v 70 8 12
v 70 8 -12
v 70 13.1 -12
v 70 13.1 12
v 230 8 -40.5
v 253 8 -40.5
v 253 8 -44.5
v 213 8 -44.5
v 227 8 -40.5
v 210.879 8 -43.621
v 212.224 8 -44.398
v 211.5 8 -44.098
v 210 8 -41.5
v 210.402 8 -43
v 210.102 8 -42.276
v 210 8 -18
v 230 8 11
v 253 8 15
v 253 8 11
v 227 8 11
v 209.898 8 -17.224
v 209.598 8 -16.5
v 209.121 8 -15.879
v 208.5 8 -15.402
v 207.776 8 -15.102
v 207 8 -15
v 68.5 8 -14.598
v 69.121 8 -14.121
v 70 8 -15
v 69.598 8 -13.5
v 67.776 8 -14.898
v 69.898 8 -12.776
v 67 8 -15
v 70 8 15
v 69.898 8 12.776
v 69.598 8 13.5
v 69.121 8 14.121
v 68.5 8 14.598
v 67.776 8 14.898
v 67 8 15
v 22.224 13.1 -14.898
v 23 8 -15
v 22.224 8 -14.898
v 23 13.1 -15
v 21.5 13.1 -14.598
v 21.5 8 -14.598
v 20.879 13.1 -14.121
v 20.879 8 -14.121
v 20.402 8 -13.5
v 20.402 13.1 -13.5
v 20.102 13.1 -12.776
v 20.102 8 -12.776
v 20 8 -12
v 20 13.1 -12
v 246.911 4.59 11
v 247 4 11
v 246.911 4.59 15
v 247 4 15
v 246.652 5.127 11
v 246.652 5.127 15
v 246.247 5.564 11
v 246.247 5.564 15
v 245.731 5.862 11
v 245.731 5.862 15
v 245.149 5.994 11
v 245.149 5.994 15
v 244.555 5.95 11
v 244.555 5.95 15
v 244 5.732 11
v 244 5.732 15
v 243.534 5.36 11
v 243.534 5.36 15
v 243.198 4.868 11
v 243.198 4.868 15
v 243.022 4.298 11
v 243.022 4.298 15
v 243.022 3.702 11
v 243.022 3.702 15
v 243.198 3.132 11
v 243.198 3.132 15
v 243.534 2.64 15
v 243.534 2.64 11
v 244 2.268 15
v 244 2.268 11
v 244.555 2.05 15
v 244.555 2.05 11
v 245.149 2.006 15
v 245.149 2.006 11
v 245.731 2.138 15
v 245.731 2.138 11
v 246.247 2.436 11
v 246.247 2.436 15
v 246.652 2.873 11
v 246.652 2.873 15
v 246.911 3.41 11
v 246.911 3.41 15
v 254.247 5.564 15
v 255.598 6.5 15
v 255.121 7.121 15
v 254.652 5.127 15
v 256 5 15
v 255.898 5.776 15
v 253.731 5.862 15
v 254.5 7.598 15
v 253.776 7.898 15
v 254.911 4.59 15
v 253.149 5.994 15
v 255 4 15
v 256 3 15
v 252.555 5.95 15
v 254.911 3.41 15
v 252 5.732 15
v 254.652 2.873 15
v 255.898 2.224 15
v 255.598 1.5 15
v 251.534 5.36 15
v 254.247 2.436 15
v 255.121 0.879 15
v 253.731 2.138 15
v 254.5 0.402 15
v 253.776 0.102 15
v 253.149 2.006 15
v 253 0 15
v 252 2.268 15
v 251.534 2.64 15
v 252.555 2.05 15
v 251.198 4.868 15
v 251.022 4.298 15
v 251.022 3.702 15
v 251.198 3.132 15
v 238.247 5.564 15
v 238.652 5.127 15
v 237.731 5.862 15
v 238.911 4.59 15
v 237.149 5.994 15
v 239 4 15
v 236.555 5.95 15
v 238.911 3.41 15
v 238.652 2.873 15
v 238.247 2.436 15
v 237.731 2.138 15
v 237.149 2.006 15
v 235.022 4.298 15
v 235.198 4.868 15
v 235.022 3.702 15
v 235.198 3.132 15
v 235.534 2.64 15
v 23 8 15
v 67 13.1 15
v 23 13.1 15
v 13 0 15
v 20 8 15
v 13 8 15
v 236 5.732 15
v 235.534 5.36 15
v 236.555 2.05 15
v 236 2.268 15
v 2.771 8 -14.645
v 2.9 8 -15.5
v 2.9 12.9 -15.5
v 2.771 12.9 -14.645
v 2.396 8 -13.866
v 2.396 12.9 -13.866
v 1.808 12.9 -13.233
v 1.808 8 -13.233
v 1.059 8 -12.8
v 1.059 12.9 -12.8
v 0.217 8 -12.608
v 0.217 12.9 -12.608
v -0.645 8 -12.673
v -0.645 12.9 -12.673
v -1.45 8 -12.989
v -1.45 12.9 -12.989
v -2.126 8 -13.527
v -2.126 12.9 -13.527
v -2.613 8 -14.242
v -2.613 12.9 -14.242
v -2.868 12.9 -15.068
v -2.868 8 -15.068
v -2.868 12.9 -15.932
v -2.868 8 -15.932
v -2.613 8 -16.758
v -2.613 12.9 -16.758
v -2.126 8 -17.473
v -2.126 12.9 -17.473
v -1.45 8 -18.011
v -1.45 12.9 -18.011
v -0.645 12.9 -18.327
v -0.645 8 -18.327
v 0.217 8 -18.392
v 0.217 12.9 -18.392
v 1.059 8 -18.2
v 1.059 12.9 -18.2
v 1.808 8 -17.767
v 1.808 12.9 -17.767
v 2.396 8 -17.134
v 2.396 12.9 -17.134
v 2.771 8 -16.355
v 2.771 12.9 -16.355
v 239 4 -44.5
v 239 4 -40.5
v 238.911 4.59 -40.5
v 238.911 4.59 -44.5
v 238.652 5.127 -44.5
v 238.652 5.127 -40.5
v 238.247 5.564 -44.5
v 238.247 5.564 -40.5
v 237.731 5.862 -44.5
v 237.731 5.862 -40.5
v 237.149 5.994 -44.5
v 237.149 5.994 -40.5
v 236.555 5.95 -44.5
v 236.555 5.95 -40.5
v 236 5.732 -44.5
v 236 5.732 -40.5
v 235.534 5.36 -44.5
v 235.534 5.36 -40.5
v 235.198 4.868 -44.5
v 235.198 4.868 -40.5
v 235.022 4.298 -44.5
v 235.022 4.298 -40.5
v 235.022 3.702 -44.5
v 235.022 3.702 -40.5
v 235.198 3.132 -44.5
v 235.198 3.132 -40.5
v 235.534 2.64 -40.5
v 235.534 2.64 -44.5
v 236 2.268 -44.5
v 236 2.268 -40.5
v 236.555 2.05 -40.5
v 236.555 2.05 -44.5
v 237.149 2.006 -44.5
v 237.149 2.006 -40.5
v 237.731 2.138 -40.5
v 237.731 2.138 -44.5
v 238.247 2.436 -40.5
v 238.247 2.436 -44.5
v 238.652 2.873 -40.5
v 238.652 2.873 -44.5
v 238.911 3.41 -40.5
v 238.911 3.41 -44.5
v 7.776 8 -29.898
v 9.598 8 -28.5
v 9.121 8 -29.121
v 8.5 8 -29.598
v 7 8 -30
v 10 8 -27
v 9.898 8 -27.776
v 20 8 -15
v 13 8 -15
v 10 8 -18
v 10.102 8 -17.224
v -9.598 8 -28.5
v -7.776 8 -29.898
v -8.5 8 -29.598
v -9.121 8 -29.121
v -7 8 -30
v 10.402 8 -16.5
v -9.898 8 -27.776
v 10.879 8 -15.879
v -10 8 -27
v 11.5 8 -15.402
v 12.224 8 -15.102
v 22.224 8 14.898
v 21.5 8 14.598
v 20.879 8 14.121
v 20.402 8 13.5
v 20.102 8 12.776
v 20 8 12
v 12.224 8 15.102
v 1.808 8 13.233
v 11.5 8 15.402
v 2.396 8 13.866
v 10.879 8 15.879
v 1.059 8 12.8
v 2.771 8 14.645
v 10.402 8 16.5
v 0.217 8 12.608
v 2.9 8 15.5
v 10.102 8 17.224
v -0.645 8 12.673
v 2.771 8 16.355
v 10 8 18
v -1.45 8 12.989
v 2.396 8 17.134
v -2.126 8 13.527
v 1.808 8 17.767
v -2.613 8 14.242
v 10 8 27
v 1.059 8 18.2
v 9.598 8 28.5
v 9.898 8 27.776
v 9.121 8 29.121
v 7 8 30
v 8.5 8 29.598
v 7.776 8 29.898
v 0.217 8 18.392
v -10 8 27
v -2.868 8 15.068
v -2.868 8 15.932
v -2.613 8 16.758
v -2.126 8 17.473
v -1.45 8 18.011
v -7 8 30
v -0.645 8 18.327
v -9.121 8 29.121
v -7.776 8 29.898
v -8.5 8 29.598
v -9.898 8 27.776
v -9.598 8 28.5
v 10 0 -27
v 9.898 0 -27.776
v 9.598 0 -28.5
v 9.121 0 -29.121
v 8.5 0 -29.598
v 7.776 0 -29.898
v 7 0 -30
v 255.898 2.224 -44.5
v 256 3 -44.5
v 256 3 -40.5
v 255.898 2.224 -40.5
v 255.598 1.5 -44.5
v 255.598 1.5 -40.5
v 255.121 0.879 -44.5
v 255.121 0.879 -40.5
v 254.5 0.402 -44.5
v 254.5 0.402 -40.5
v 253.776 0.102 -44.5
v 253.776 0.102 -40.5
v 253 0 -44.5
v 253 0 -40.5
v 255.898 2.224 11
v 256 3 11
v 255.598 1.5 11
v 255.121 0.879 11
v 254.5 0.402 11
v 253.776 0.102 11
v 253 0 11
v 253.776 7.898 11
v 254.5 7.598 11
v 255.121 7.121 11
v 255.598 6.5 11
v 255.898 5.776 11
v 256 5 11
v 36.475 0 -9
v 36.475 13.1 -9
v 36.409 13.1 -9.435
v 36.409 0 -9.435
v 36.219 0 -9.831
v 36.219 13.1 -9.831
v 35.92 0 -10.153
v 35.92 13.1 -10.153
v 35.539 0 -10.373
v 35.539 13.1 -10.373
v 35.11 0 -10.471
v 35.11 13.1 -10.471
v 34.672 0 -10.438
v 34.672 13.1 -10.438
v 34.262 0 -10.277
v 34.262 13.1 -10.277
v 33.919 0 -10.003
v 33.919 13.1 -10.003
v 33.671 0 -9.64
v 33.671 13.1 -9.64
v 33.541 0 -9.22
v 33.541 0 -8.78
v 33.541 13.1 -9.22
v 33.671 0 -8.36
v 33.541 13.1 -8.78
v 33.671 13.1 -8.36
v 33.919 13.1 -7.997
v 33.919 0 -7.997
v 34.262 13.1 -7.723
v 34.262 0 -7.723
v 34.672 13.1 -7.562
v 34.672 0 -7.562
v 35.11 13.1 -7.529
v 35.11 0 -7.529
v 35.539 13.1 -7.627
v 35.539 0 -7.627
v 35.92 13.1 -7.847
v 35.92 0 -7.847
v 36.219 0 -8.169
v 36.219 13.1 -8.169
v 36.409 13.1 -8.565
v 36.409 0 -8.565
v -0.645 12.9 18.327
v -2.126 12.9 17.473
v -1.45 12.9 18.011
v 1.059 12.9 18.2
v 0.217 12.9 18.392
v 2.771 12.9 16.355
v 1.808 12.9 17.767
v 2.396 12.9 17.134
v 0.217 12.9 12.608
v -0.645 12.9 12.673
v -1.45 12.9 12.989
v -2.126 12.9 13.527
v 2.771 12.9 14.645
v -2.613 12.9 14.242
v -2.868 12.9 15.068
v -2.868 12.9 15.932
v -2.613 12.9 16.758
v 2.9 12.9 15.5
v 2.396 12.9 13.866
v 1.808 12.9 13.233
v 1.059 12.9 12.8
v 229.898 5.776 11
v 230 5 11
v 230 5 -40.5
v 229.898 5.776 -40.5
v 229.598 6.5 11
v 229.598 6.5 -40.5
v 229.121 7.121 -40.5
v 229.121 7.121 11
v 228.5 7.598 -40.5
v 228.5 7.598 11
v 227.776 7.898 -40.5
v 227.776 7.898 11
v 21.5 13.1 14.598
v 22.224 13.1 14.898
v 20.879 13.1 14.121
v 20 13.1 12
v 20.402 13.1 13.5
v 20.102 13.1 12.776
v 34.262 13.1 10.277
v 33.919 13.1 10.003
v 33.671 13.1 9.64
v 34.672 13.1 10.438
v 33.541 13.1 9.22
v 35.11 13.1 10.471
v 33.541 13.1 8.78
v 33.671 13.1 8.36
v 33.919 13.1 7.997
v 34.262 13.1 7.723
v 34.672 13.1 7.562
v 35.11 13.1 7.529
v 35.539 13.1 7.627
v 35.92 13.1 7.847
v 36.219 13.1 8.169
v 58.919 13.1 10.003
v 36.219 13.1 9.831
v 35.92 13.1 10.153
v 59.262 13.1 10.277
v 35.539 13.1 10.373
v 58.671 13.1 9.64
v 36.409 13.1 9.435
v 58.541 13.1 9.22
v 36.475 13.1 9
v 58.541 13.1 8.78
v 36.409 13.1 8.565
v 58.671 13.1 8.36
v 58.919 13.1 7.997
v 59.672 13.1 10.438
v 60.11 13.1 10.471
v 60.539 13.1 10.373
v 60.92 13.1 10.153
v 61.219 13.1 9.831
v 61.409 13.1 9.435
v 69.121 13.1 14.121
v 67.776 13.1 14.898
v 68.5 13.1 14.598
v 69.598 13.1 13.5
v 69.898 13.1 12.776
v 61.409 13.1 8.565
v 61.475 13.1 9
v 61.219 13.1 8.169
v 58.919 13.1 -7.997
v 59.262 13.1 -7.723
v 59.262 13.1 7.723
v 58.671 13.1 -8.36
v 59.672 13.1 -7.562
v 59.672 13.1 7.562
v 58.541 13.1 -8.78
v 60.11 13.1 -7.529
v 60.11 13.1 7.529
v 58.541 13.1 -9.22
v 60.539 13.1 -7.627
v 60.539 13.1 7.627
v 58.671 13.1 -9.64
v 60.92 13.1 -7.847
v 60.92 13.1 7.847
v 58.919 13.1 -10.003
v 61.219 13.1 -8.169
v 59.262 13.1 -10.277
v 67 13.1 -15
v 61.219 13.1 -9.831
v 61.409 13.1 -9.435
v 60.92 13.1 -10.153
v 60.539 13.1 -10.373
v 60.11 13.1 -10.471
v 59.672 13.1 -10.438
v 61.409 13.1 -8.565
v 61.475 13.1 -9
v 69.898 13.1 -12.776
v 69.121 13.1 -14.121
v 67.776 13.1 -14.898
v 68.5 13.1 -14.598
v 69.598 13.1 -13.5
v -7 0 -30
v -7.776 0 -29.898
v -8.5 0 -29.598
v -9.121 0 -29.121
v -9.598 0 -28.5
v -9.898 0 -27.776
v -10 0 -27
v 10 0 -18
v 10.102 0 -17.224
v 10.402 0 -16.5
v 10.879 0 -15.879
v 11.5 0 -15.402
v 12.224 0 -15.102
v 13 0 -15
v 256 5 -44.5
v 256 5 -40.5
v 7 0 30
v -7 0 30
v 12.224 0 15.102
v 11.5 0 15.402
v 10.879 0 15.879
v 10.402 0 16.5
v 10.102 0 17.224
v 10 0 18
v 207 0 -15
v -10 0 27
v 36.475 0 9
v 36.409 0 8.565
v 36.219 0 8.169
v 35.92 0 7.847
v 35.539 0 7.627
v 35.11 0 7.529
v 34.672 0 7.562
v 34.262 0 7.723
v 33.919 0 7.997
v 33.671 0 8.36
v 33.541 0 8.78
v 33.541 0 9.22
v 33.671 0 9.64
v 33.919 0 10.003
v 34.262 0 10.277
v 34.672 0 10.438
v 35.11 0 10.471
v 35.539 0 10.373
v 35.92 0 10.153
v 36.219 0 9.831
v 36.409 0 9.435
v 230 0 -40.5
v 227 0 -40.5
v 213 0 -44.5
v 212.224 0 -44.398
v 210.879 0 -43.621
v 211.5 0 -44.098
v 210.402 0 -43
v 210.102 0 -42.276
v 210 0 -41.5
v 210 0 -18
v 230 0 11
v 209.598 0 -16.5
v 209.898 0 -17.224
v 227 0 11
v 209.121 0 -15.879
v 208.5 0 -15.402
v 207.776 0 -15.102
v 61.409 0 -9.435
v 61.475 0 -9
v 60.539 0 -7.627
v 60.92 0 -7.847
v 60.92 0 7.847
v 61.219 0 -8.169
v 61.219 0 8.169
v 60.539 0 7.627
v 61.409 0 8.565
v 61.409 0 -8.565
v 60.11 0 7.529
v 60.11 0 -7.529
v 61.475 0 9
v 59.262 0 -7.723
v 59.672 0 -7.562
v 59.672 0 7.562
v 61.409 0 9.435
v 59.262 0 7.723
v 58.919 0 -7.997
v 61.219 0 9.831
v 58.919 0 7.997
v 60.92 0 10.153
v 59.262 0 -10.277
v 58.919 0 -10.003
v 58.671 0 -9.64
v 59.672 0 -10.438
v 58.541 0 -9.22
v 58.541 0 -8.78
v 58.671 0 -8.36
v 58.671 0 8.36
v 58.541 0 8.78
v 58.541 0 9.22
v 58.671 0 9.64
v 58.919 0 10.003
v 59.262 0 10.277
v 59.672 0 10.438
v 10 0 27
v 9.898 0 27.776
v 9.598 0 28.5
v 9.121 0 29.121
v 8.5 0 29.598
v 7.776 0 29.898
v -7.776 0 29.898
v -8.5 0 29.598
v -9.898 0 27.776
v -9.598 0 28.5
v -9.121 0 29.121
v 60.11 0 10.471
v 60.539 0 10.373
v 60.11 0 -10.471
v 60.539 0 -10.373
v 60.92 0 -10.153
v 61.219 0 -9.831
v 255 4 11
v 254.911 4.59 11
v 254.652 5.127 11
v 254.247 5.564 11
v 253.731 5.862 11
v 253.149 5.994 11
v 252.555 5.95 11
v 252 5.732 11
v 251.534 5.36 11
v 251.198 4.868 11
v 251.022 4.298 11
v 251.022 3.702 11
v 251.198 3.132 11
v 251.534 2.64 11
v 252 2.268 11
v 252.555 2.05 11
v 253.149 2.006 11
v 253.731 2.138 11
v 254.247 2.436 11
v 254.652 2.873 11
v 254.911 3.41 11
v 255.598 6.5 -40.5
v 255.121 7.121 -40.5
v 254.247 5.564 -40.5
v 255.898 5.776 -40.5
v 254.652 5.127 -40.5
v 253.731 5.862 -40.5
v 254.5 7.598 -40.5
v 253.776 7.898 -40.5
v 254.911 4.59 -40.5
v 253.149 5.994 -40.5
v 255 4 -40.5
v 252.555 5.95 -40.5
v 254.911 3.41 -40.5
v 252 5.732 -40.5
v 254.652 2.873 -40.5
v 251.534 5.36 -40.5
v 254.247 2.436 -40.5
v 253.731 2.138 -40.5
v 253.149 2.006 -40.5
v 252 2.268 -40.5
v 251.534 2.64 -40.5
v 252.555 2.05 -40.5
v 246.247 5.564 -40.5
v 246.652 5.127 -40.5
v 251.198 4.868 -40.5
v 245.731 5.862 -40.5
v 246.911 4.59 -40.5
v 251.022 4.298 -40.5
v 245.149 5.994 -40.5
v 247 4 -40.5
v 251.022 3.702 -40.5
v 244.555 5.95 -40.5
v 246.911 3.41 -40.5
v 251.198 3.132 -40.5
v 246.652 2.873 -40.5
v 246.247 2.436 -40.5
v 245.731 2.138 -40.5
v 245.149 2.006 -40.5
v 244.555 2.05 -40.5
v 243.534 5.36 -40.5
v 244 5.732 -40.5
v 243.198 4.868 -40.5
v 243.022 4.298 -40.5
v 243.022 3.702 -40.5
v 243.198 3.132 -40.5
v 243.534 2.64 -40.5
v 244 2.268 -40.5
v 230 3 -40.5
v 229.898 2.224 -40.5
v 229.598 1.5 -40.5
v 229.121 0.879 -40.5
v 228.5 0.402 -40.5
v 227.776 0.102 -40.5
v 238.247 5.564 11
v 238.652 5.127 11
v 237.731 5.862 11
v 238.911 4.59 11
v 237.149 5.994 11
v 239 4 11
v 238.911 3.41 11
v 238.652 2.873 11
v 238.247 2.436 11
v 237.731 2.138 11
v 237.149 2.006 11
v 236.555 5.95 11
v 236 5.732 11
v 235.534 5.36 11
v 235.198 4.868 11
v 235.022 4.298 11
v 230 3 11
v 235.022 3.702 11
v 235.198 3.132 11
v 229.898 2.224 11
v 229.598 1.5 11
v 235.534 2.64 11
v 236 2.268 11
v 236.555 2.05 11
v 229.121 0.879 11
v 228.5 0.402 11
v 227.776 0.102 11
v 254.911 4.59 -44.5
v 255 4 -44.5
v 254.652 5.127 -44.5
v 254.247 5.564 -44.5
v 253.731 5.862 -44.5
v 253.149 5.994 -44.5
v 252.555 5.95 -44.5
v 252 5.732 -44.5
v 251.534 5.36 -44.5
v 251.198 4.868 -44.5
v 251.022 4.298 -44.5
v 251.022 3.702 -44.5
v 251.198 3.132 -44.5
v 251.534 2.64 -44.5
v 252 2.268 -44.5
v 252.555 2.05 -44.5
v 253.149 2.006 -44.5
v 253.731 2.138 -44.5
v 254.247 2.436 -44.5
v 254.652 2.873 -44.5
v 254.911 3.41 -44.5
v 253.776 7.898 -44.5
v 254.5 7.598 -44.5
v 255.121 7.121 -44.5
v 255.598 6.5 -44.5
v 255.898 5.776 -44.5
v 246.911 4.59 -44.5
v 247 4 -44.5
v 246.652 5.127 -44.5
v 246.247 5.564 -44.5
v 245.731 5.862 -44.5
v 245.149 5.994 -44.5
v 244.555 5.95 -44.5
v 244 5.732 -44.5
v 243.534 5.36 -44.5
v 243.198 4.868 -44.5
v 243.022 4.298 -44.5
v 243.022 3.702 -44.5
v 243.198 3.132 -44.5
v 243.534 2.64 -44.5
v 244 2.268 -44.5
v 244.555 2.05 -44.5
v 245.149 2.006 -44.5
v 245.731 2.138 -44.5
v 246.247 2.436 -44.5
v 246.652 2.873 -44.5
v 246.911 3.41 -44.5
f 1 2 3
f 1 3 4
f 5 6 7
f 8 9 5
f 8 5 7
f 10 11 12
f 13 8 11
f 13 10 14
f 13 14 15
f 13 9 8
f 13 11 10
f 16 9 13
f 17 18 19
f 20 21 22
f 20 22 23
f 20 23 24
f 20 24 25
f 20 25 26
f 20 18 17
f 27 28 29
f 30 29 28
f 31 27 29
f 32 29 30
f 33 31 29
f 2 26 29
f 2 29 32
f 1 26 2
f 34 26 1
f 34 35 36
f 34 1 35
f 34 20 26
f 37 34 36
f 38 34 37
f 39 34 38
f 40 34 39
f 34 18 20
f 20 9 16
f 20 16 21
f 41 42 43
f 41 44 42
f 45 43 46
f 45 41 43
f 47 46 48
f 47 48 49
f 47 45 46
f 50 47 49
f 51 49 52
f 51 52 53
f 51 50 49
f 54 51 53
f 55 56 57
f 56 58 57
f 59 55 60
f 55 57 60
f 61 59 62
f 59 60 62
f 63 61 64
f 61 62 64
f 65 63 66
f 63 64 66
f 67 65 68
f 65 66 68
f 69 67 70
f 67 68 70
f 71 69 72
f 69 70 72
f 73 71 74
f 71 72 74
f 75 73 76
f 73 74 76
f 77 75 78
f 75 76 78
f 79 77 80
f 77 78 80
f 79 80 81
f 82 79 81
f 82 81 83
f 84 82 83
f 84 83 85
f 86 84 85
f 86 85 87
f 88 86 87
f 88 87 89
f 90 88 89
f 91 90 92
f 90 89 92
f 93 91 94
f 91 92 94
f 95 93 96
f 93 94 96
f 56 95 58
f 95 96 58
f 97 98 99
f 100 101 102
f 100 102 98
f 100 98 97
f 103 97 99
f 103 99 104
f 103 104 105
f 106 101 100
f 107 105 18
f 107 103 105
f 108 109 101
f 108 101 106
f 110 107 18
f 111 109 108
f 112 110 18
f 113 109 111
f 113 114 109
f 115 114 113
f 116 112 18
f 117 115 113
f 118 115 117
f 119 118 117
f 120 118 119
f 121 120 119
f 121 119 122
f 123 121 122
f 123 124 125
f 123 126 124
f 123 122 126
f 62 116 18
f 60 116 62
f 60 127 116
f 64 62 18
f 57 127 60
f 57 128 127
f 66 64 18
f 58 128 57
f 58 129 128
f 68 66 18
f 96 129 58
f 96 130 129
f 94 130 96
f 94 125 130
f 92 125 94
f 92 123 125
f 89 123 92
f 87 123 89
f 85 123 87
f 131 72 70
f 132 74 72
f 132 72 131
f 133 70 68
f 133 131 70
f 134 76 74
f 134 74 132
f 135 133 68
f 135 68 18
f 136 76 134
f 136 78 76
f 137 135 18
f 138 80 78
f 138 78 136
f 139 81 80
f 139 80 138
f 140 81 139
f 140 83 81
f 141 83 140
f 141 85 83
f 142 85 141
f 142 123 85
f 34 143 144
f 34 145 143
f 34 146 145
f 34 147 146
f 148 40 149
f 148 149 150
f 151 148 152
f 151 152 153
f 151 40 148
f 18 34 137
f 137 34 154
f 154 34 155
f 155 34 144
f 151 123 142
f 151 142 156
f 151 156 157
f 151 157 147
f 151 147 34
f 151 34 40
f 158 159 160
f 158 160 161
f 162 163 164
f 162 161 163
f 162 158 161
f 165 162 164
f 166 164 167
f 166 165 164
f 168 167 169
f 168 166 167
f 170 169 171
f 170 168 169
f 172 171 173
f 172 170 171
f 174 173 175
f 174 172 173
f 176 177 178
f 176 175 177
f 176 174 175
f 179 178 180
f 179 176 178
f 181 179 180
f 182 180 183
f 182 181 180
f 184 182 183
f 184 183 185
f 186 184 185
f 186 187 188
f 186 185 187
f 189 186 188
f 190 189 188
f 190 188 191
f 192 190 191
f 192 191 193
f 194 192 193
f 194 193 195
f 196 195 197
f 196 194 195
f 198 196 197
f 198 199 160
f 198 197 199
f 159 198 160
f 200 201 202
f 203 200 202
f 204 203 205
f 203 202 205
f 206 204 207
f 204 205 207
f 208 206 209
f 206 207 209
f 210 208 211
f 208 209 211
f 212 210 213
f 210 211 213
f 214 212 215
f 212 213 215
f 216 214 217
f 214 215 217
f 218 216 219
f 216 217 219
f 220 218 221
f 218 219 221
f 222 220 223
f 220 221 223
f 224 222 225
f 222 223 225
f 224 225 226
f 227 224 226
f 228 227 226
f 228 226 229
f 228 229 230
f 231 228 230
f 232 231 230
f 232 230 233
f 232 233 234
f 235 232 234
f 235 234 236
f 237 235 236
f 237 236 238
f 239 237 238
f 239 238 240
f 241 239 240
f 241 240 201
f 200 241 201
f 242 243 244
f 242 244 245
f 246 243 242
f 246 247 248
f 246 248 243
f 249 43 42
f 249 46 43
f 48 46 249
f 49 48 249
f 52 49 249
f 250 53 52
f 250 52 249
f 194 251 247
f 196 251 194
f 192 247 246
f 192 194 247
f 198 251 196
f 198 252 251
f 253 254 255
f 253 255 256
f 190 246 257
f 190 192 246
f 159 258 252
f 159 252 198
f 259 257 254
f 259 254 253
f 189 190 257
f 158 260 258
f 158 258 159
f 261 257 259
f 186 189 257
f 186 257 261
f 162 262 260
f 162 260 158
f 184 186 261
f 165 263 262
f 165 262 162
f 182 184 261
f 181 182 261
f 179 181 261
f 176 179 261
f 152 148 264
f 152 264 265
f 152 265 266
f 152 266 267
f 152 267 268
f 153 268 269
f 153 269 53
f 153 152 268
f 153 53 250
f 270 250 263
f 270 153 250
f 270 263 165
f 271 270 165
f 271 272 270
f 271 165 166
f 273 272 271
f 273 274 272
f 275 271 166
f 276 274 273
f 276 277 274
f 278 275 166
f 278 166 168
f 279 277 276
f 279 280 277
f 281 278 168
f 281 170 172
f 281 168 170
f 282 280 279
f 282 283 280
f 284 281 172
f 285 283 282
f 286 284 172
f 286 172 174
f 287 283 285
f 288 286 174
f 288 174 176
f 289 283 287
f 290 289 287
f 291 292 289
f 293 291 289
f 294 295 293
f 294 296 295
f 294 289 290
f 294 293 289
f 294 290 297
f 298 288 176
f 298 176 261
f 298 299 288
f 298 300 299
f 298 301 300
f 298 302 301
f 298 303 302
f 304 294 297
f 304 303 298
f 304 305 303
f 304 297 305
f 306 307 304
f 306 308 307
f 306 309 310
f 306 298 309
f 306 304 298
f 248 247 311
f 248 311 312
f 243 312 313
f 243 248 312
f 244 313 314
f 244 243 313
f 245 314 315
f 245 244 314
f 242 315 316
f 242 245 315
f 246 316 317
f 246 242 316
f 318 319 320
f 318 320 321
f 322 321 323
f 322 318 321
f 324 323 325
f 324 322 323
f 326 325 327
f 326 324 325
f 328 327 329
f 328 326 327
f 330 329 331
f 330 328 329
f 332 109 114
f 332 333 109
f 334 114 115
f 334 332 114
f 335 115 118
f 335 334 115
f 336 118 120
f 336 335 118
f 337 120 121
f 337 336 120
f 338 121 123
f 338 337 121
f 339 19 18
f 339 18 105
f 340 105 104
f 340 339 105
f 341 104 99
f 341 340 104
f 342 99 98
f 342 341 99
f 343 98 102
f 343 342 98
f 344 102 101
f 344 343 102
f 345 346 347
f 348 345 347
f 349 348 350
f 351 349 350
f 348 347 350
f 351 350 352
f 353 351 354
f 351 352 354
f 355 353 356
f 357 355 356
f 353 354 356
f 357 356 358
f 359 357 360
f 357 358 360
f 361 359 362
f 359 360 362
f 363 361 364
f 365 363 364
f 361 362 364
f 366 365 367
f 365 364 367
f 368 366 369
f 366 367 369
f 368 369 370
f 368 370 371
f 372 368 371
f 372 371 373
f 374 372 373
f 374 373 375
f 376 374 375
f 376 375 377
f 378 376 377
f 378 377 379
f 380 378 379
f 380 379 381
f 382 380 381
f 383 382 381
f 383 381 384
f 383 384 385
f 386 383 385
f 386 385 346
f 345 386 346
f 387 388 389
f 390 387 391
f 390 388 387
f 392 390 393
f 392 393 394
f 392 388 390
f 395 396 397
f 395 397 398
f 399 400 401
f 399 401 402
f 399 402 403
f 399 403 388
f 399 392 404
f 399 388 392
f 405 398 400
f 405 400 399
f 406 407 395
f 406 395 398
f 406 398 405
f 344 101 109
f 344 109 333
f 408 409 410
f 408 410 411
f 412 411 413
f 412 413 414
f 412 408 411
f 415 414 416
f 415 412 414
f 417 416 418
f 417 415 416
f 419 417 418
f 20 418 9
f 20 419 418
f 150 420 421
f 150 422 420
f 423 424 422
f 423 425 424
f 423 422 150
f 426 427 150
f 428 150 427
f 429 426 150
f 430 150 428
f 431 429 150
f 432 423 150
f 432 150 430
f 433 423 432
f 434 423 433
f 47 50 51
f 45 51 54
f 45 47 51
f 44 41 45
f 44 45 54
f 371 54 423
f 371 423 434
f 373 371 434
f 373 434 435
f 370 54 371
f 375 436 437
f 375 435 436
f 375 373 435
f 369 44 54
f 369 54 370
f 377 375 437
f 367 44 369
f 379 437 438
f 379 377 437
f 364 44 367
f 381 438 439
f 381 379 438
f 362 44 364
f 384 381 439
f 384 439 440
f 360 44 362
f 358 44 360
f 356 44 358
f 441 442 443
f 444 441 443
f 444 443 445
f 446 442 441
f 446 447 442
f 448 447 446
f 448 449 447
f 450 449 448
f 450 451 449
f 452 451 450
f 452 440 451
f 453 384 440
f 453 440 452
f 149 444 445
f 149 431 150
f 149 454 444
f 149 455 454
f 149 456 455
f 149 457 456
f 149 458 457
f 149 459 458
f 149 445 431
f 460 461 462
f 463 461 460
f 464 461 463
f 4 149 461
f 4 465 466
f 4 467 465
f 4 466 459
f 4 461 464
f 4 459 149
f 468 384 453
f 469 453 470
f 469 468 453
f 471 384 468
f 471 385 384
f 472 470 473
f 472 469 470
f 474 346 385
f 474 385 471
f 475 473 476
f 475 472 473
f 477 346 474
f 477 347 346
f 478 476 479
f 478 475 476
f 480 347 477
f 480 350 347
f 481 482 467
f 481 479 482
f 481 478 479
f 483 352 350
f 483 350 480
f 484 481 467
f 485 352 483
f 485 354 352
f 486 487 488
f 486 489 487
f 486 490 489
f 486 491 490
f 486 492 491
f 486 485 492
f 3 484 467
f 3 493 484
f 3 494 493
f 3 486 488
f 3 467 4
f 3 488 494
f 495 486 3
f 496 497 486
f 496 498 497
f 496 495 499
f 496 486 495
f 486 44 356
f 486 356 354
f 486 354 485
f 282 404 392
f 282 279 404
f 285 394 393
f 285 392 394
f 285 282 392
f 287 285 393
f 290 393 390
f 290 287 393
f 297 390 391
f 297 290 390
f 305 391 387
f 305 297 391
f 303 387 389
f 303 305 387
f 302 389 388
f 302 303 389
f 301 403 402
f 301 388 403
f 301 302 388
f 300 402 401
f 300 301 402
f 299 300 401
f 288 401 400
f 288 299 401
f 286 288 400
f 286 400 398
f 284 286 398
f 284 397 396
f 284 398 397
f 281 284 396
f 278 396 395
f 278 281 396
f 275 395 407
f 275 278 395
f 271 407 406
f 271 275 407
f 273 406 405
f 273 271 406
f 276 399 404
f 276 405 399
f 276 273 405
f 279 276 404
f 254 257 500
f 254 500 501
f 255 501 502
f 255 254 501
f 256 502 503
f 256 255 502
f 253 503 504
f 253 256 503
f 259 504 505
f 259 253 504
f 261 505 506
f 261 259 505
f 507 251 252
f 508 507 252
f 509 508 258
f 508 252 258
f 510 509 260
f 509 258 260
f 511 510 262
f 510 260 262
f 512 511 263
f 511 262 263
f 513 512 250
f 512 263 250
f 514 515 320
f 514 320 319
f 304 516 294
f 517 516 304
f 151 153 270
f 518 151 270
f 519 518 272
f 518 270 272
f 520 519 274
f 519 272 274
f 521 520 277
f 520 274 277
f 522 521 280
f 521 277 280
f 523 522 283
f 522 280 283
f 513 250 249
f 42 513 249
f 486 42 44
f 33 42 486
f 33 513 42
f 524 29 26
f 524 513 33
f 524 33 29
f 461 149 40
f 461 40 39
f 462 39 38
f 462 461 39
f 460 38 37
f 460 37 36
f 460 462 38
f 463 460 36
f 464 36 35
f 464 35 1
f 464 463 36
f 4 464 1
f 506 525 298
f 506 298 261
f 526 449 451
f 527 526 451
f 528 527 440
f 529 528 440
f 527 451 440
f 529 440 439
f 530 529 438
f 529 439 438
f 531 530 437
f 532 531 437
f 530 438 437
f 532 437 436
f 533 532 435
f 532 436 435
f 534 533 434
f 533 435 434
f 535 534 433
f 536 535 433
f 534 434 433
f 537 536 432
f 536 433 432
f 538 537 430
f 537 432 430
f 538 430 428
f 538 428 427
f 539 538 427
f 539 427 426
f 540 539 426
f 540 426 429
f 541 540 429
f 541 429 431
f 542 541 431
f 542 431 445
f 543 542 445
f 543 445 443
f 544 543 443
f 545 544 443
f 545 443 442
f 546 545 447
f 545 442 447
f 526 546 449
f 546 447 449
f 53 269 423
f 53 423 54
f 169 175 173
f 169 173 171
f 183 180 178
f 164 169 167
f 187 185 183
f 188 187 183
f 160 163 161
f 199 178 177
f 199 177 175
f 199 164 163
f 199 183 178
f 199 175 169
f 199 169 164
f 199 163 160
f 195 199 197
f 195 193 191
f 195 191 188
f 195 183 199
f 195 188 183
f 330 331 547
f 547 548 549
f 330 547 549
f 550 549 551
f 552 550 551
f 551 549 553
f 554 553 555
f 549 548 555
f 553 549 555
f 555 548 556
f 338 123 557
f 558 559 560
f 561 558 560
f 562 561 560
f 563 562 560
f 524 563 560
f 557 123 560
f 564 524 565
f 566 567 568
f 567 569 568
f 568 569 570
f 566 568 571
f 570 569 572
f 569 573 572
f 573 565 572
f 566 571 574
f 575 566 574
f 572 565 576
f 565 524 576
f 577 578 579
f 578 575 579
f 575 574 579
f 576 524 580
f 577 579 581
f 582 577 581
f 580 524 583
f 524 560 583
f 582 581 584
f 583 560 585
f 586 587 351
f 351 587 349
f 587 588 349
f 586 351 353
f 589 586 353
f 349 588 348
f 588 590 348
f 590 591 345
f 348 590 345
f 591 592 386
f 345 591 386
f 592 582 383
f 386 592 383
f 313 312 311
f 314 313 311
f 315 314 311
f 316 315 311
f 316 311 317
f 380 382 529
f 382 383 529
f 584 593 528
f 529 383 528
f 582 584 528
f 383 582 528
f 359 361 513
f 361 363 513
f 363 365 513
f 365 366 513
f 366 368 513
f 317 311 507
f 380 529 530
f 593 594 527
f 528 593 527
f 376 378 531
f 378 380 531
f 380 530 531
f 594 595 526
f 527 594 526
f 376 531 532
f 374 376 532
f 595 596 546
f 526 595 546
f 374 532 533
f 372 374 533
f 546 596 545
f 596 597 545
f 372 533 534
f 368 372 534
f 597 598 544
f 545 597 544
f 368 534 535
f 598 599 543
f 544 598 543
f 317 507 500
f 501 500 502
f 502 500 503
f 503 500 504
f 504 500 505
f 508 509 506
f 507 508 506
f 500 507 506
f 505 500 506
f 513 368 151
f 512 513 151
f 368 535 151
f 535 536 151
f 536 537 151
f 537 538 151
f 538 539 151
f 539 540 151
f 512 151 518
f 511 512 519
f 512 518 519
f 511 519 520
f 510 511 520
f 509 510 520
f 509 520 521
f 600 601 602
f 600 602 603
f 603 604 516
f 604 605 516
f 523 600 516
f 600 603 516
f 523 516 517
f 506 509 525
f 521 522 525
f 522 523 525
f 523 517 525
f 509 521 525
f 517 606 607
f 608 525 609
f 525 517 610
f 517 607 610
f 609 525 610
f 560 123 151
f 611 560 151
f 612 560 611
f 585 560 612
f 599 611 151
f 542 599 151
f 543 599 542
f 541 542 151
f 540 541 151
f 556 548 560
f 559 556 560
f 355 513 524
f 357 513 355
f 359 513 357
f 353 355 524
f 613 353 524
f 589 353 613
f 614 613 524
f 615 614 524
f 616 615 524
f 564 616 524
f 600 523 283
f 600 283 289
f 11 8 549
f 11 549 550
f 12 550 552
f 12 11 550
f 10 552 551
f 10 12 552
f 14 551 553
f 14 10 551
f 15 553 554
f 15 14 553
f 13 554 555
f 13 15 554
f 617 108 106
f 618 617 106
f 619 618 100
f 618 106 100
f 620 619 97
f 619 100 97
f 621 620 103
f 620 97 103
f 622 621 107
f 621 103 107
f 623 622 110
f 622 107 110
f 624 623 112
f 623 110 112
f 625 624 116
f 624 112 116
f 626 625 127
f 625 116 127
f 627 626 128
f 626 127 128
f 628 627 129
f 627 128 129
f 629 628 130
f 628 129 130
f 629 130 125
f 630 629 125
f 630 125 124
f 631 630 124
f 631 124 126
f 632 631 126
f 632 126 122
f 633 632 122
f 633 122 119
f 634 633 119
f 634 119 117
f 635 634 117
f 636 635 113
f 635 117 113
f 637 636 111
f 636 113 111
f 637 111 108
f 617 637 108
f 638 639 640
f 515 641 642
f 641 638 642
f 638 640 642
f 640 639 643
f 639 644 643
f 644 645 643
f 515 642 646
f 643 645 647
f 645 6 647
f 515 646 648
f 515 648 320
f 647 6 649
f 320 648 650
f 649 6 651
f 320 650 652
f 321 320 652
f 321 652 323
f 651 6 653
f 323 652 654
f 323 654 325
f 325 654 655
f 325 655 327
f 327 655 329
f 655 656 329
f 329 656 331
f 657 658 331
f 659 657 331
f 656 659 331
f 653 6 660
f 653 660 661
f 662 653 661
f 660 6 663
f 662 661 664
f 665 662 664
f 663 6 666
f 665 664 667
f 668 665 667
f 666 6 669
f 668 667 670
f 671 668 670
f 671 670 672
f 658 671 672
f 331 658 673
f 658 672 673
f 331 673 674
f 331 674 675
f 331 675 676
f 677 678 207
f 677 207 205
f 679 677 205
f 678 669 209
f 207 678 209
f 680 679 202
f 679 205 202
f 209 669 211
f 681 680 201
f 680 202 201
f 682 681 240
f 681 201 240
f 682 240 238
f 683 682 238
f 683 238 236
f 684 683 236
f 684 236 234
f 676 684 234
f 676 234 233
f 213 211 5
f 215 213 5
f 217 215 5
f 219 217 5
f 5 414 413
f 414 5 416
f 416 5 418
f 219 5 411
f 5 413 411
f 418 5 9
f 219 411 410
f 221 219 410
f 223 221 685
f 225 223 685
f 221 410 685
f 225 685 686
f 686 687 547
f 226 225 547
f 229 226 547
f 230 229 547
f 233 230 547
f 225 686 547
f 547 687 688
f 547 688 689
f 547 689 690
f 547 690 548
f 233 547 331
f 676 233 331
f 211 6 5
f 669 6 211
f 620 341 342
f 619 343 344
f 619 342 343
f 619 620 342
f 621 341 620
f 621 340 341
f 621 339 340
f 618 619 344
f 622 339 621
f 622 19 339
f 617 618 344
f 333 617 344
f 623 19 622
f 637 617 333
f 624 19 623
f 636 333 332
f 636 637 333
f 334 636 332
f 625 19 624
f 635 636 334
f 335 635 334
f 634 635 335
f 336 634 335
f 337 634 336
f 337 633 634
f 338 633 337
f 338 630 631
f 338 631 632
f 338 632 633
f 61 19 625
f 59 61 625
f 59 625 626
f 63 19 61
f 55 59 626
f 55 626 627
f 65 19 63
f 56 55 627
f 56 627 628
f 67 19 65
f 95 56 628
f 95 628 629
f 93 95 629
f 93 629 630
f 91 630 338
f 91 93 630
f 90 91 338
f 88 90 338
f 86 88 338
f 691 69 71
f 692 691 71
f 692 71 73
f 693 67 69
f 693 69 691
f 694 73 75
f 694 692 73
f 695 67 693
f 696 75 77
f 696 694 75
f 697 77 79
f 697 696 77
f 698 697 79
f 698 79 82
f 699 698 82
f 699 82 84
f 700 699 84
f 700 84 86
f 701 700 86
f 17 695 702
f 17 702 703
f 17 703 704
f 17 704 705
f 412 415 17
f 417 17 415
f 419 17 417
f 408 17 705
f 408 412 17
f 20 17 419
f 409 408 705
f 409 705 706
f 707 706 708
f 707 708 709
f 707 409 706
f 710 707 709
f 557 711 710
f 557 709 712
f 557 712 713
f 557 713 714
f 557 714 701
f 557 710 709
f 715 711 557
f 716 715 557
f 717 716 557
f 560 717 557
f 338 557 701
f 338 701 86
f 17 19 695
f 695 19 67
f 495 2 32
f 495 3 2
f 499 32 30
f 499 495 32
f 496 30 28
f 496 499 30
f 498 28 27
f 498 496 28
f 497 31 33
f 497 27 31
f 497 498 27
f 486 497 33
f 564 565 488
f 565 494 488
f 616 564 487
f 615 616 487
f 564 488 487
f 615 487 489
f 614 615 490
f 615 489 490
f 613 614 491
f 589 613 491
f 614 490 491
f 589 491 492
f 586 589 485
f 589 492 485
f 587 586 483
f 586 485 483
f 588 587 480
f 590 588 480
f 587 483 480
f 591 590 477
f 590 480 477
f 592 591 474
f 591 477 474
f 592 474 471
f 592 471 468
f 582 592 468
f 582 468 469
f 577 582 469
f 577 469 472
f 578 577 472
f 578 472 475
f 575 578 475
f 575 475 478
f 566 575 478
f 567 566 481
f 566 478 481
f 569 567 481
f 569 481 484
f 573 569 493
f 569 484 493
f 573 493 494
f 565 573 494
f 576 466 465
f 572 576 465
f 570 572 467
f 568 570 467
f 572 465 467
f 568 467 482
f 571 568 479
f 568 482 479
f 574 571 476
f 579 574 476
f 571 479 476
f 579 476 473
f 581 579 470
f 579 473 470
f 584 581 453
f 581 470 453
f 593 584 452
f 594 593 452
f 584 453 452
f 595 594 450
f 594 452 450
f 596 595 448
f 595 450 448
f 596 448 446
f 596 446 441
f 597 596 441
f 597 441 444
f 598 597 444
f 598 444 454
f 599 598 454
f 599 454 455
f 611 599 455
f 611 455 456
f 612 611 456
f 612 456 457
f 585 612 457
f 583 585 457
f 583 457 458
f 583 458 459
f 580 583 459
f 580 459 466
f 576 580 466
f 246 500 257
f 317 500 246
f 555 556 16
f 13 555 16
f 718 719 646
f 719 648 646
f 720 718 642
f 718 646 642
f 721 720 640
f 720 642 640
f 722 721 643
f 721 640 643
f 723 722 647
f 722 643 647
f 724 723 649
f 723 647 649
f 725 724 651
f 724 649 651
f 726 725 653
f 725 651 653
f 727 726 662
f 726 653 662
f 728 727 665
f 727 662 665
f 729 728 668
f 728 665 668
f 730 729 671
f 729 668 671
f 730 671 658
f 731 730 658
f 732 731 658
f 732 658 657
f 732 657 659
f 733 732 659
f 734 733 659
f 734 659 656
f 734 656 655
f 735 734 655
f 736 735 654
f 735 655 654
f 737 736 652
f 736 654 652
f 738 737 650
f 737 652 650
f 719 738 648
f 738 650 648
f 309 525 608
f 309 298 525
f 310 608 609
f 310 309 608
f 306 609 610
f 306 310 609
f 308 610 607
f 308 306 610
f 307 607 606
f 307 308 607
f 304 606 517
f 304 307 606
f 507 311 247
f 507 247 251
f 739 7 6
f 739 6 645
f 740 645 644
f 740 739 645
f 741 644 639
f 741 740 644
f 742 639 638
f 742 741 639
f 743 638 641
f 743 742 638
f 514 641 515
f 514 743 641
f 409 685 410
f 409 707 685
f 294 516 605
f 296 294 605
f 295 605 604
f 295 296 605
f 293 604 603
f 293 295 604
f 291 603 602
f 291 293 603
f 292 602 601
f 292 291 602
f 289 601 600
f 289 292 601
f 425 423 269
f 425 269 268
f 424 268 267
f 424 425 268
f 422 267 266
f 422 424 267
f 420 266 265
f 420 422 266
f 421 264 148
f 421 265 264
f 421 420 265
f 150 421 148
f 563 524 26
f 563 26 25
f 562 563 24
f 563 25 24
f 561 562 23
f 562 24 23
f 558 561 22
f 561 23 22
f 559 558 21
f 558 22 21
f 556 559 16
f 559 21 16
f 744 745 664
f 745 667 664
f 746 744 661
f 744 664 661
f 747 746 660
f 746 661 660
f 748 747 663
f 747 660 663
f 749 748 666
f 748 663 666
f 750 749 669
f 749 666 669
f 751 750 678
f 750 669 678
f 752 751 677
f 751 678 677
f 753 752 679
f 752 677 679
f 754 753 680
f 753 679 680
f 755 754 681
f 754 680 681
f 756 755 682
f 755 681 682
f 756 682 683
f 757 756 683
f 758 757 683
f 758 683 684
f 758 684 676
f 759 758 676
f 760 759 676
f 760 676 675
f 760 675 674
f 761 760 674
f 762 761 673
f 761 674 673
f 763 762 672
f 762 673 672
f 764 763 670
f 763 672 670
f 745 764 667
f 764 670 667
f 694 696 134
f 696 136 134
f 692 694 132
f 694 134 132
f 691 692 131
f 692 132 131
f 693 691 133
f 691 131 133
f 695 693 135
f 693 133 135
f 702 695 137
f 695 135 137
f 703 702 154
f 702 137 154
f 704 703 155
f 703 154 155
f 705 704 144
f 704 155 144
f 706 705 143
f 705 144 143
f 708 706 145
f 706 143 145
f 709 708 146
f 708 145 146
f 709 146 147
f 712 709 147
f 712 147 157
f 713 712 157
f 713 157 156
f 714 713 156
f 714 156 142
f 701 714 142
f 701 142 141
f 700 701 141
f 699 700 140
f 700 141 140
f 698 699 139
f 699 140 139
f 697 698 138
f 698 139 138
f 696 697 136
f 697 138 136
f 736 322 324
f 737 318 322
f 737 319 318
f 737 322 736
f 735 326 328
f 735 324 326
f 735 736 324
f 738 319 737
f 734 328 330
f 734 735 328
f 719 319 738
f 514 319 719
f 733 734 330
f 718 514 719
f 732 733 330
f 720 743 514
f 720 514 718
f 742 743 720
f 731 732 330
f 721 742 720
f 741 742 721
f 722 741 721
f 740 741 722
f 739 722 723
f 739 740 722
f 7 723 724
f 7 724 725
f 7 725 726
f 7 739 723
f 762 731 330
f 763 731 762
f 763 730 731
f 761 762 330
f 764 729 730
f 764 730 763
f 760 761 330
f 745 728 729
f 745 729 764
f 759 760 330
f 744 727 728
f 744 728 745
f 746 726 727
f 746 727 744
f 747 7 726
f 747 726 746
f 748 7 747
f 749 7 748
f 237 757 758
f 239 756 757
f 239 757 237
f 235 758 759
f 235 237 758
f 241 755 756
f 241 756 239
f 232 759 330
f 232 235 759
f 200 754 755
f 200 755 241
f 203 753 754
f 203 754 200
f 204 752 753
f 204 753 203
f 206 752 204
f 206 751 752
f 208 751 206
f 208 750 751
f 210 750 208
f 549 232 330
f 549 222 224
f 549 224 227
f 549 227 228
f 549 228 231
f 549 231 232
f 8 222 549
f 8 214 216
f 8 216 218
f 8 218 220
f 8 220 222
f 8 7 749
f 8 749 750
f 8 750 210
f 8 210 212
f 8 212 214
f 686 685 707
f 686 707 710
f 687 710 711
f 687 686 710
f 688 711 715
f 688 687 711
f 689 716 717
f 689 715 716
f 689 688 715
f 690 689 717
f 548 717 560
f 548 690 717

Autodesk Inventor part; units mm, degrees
ref_plane "YZ Plane" through (0, 0, 0) normal (1, 0, 0) x (0, 1, 0)
ref_plane "XZ Plane" through (0, 0, 0) normal (0, 1, 0) x (-1, 0, 0)
ref_plane "XY Plane" through (0, 0, 0) normal (0, 0, 1) x (1, 0, 0)
sketch "Sketch1" plane through (0, 0, 0) normal (0, 1, 0) x (-1, 0, 0)
  line L0 (10, 30) -> (10, -30)
  line L1 (10, -30) -> (-10, -30)
  line L2 (-10, -30) -> (-10, -15)
  line L3 (-10, -15) -> (-230, -15)
  line L4 (-230, -15) -> (-230, 15)
  line L5 (-230, 15) -> (-10, 15)
  line L6 (-10, 15) -> (-10, 30)
  line L7 (-10, 30) -> (10, 30)
  line L8 (58, 0) -> (-278, 0) construction
  point P0 (0, 0)
  dimension "d0" = 60
  dimension "d2" = 10
  dimension "d3" = 10
  dimension "d4" = 30
  dimension "d5" = 220
extrude "Extrusion1" add sketch "Sketch1" along normal blind 8
sketch "Sketch2" plane through (0, 8, 0) normal (0, 1, 0) x (1, 0, 0)
  circle A0 centre (0, -15.5) radius 2.9
  circle A1 centre (0, 15.5) radius 2.9
  line L0 (0, 42) -> (0, -42) construction
  line L1 (-58, 0) -> (278, 0) construction
  point P0 (0, 0)
  dimension "d8" = 5.8
  dimension "d9" = 31
extrude "Extrusion2" add sketch "Sketch2" along normal blind 4.9
sketch "Sketch3" plane through (0, 8, 0) normal (0, 1, 0) x (1, 0, 0)
  line L0 (230, 15) -> (10, 15) construction
  line L1 (10, -15) -> (230, -15) construction
  line L2 (20, 15) -> (70, 15)
  line L3 (70, 15) -> (70, -15)
  line L4 (70, -15) -> (20, -15)
  line L5 (20, -15) -> (20, 15)
  point P0 (0, 0)
  dimension "d12" = 10
  dimension "d13" = 50
extrude "Extrusion3" add sketch "Sketch3" along normal blind 5.1
sketch "Sketch4" plane through (0, 13.1, 0) normal (0, 1, 0) x (1, 0, 0)
  circle A0 centre (35, 9) radius 1.475
  circle A1 centre (60, 9) radius 1.475
  circle A2 centre (35, -9) radius 1.475
  circle A3 centre (60, -9) radius 1.475
  line L0 (-58, 0) -> (278, 0) construction
  line L1 (35, 9) -> (35, -9) construction
  line L2 (60, 9) -> (60, -9) construction
  line L3 (20, 15) -> (20, -15) construction
  point P0 (0, 0)
  dimension "d16" = 2.95
  dimension "d17" = 18
  dimension "d18" = 25
  dimension "d19" = 15
extrude "Extrusion4" cut sketch "Sketch4" against normal up to surface (13.1 mm away)
sketch "Sketch7" plane through (230, 0, -15) normal (0, 0, -1) x (-1, 0, 0)
  line L0 (0, 0) -> (0, 8) projected
  line L1 (0, 8) -> (160, 8) projected
  line L2 (0, 0) -> (220, 0) projected
  line L3 (20, 0) -> (20, 8)
  point P0 (230, 0)
  dimension "d37" = 20
extrude "Extrusion7" add sketch "Sketch7" along normal blind 29.5
sketch "Sketch8" plane through (230, 0, 15) normal (1, 0, 0) x (0, 0, -1)
  line L0 (0, 0) -> (0, 8) projected
  line L1 (59.5, 8) -> (59.5, 0) projected
  line L2 (0, 0) -> (59.5, 0) projected
  line L3 (0, 8) -> (59.5, 8) projected
  line L4 (4, 8) -> (4, 0)
  line L5 (55.5, 8) -> (55.5, 0)
  point P0 (15, 0)
  dimension "d40" = 4
  dimension "d41" = 4
extrude "Extrusion8" add sketch "Sketch8" along normal blind 26 contours L0 L3 L4 L2 | L5 L3 L1 L2
sketch "Sketch9" plane through (10, 0, 15) normal (0, 0, 1) x (1, 0, 0)
  line L0 (246, 8) -> (246, 0) construction
  line L1 (246, 4) -> (227, 4) construction
  circle A0 centre (227, 4) radius 2
  circle A1 centre (235, 4) radius 2
  circle A2 centre (243, 4) radius 2
  point P0 (-10, 0)
  dimension "d44" = 4
  dimension "d45" = 8
  dimension "d46" = 8
  dimension "d47" = 3
extrude "Extrusion9" cut sketch "Sketch9" against normal up to surface (59.5 mm away)
fillet "Fillet4" radius 3 2 edges at (210, 4, -15) (210, 4, -44.5)
fillet "Fillet5" radius 3 6 edges at (230, 0, -14.75) (230, 8, -14.75) (256, 0, 13) (256, 8, 13) (256, 0, -42.5) (256, 8, -42.5)
fillet "Fillet2" radius 3 4 edges at (20, 10.55, 15) (20, 10.55, -15) (70, 10.55, 15) (70, 10.55, -15)
fillet "Fillet3" radius 3 6 edges at (10, 4, 15) (10, 4, 30) (-10, 4, 30) (-10, 4, -30) (10, 4, -30) (10, 4, -15)
properties part number "Arm"
